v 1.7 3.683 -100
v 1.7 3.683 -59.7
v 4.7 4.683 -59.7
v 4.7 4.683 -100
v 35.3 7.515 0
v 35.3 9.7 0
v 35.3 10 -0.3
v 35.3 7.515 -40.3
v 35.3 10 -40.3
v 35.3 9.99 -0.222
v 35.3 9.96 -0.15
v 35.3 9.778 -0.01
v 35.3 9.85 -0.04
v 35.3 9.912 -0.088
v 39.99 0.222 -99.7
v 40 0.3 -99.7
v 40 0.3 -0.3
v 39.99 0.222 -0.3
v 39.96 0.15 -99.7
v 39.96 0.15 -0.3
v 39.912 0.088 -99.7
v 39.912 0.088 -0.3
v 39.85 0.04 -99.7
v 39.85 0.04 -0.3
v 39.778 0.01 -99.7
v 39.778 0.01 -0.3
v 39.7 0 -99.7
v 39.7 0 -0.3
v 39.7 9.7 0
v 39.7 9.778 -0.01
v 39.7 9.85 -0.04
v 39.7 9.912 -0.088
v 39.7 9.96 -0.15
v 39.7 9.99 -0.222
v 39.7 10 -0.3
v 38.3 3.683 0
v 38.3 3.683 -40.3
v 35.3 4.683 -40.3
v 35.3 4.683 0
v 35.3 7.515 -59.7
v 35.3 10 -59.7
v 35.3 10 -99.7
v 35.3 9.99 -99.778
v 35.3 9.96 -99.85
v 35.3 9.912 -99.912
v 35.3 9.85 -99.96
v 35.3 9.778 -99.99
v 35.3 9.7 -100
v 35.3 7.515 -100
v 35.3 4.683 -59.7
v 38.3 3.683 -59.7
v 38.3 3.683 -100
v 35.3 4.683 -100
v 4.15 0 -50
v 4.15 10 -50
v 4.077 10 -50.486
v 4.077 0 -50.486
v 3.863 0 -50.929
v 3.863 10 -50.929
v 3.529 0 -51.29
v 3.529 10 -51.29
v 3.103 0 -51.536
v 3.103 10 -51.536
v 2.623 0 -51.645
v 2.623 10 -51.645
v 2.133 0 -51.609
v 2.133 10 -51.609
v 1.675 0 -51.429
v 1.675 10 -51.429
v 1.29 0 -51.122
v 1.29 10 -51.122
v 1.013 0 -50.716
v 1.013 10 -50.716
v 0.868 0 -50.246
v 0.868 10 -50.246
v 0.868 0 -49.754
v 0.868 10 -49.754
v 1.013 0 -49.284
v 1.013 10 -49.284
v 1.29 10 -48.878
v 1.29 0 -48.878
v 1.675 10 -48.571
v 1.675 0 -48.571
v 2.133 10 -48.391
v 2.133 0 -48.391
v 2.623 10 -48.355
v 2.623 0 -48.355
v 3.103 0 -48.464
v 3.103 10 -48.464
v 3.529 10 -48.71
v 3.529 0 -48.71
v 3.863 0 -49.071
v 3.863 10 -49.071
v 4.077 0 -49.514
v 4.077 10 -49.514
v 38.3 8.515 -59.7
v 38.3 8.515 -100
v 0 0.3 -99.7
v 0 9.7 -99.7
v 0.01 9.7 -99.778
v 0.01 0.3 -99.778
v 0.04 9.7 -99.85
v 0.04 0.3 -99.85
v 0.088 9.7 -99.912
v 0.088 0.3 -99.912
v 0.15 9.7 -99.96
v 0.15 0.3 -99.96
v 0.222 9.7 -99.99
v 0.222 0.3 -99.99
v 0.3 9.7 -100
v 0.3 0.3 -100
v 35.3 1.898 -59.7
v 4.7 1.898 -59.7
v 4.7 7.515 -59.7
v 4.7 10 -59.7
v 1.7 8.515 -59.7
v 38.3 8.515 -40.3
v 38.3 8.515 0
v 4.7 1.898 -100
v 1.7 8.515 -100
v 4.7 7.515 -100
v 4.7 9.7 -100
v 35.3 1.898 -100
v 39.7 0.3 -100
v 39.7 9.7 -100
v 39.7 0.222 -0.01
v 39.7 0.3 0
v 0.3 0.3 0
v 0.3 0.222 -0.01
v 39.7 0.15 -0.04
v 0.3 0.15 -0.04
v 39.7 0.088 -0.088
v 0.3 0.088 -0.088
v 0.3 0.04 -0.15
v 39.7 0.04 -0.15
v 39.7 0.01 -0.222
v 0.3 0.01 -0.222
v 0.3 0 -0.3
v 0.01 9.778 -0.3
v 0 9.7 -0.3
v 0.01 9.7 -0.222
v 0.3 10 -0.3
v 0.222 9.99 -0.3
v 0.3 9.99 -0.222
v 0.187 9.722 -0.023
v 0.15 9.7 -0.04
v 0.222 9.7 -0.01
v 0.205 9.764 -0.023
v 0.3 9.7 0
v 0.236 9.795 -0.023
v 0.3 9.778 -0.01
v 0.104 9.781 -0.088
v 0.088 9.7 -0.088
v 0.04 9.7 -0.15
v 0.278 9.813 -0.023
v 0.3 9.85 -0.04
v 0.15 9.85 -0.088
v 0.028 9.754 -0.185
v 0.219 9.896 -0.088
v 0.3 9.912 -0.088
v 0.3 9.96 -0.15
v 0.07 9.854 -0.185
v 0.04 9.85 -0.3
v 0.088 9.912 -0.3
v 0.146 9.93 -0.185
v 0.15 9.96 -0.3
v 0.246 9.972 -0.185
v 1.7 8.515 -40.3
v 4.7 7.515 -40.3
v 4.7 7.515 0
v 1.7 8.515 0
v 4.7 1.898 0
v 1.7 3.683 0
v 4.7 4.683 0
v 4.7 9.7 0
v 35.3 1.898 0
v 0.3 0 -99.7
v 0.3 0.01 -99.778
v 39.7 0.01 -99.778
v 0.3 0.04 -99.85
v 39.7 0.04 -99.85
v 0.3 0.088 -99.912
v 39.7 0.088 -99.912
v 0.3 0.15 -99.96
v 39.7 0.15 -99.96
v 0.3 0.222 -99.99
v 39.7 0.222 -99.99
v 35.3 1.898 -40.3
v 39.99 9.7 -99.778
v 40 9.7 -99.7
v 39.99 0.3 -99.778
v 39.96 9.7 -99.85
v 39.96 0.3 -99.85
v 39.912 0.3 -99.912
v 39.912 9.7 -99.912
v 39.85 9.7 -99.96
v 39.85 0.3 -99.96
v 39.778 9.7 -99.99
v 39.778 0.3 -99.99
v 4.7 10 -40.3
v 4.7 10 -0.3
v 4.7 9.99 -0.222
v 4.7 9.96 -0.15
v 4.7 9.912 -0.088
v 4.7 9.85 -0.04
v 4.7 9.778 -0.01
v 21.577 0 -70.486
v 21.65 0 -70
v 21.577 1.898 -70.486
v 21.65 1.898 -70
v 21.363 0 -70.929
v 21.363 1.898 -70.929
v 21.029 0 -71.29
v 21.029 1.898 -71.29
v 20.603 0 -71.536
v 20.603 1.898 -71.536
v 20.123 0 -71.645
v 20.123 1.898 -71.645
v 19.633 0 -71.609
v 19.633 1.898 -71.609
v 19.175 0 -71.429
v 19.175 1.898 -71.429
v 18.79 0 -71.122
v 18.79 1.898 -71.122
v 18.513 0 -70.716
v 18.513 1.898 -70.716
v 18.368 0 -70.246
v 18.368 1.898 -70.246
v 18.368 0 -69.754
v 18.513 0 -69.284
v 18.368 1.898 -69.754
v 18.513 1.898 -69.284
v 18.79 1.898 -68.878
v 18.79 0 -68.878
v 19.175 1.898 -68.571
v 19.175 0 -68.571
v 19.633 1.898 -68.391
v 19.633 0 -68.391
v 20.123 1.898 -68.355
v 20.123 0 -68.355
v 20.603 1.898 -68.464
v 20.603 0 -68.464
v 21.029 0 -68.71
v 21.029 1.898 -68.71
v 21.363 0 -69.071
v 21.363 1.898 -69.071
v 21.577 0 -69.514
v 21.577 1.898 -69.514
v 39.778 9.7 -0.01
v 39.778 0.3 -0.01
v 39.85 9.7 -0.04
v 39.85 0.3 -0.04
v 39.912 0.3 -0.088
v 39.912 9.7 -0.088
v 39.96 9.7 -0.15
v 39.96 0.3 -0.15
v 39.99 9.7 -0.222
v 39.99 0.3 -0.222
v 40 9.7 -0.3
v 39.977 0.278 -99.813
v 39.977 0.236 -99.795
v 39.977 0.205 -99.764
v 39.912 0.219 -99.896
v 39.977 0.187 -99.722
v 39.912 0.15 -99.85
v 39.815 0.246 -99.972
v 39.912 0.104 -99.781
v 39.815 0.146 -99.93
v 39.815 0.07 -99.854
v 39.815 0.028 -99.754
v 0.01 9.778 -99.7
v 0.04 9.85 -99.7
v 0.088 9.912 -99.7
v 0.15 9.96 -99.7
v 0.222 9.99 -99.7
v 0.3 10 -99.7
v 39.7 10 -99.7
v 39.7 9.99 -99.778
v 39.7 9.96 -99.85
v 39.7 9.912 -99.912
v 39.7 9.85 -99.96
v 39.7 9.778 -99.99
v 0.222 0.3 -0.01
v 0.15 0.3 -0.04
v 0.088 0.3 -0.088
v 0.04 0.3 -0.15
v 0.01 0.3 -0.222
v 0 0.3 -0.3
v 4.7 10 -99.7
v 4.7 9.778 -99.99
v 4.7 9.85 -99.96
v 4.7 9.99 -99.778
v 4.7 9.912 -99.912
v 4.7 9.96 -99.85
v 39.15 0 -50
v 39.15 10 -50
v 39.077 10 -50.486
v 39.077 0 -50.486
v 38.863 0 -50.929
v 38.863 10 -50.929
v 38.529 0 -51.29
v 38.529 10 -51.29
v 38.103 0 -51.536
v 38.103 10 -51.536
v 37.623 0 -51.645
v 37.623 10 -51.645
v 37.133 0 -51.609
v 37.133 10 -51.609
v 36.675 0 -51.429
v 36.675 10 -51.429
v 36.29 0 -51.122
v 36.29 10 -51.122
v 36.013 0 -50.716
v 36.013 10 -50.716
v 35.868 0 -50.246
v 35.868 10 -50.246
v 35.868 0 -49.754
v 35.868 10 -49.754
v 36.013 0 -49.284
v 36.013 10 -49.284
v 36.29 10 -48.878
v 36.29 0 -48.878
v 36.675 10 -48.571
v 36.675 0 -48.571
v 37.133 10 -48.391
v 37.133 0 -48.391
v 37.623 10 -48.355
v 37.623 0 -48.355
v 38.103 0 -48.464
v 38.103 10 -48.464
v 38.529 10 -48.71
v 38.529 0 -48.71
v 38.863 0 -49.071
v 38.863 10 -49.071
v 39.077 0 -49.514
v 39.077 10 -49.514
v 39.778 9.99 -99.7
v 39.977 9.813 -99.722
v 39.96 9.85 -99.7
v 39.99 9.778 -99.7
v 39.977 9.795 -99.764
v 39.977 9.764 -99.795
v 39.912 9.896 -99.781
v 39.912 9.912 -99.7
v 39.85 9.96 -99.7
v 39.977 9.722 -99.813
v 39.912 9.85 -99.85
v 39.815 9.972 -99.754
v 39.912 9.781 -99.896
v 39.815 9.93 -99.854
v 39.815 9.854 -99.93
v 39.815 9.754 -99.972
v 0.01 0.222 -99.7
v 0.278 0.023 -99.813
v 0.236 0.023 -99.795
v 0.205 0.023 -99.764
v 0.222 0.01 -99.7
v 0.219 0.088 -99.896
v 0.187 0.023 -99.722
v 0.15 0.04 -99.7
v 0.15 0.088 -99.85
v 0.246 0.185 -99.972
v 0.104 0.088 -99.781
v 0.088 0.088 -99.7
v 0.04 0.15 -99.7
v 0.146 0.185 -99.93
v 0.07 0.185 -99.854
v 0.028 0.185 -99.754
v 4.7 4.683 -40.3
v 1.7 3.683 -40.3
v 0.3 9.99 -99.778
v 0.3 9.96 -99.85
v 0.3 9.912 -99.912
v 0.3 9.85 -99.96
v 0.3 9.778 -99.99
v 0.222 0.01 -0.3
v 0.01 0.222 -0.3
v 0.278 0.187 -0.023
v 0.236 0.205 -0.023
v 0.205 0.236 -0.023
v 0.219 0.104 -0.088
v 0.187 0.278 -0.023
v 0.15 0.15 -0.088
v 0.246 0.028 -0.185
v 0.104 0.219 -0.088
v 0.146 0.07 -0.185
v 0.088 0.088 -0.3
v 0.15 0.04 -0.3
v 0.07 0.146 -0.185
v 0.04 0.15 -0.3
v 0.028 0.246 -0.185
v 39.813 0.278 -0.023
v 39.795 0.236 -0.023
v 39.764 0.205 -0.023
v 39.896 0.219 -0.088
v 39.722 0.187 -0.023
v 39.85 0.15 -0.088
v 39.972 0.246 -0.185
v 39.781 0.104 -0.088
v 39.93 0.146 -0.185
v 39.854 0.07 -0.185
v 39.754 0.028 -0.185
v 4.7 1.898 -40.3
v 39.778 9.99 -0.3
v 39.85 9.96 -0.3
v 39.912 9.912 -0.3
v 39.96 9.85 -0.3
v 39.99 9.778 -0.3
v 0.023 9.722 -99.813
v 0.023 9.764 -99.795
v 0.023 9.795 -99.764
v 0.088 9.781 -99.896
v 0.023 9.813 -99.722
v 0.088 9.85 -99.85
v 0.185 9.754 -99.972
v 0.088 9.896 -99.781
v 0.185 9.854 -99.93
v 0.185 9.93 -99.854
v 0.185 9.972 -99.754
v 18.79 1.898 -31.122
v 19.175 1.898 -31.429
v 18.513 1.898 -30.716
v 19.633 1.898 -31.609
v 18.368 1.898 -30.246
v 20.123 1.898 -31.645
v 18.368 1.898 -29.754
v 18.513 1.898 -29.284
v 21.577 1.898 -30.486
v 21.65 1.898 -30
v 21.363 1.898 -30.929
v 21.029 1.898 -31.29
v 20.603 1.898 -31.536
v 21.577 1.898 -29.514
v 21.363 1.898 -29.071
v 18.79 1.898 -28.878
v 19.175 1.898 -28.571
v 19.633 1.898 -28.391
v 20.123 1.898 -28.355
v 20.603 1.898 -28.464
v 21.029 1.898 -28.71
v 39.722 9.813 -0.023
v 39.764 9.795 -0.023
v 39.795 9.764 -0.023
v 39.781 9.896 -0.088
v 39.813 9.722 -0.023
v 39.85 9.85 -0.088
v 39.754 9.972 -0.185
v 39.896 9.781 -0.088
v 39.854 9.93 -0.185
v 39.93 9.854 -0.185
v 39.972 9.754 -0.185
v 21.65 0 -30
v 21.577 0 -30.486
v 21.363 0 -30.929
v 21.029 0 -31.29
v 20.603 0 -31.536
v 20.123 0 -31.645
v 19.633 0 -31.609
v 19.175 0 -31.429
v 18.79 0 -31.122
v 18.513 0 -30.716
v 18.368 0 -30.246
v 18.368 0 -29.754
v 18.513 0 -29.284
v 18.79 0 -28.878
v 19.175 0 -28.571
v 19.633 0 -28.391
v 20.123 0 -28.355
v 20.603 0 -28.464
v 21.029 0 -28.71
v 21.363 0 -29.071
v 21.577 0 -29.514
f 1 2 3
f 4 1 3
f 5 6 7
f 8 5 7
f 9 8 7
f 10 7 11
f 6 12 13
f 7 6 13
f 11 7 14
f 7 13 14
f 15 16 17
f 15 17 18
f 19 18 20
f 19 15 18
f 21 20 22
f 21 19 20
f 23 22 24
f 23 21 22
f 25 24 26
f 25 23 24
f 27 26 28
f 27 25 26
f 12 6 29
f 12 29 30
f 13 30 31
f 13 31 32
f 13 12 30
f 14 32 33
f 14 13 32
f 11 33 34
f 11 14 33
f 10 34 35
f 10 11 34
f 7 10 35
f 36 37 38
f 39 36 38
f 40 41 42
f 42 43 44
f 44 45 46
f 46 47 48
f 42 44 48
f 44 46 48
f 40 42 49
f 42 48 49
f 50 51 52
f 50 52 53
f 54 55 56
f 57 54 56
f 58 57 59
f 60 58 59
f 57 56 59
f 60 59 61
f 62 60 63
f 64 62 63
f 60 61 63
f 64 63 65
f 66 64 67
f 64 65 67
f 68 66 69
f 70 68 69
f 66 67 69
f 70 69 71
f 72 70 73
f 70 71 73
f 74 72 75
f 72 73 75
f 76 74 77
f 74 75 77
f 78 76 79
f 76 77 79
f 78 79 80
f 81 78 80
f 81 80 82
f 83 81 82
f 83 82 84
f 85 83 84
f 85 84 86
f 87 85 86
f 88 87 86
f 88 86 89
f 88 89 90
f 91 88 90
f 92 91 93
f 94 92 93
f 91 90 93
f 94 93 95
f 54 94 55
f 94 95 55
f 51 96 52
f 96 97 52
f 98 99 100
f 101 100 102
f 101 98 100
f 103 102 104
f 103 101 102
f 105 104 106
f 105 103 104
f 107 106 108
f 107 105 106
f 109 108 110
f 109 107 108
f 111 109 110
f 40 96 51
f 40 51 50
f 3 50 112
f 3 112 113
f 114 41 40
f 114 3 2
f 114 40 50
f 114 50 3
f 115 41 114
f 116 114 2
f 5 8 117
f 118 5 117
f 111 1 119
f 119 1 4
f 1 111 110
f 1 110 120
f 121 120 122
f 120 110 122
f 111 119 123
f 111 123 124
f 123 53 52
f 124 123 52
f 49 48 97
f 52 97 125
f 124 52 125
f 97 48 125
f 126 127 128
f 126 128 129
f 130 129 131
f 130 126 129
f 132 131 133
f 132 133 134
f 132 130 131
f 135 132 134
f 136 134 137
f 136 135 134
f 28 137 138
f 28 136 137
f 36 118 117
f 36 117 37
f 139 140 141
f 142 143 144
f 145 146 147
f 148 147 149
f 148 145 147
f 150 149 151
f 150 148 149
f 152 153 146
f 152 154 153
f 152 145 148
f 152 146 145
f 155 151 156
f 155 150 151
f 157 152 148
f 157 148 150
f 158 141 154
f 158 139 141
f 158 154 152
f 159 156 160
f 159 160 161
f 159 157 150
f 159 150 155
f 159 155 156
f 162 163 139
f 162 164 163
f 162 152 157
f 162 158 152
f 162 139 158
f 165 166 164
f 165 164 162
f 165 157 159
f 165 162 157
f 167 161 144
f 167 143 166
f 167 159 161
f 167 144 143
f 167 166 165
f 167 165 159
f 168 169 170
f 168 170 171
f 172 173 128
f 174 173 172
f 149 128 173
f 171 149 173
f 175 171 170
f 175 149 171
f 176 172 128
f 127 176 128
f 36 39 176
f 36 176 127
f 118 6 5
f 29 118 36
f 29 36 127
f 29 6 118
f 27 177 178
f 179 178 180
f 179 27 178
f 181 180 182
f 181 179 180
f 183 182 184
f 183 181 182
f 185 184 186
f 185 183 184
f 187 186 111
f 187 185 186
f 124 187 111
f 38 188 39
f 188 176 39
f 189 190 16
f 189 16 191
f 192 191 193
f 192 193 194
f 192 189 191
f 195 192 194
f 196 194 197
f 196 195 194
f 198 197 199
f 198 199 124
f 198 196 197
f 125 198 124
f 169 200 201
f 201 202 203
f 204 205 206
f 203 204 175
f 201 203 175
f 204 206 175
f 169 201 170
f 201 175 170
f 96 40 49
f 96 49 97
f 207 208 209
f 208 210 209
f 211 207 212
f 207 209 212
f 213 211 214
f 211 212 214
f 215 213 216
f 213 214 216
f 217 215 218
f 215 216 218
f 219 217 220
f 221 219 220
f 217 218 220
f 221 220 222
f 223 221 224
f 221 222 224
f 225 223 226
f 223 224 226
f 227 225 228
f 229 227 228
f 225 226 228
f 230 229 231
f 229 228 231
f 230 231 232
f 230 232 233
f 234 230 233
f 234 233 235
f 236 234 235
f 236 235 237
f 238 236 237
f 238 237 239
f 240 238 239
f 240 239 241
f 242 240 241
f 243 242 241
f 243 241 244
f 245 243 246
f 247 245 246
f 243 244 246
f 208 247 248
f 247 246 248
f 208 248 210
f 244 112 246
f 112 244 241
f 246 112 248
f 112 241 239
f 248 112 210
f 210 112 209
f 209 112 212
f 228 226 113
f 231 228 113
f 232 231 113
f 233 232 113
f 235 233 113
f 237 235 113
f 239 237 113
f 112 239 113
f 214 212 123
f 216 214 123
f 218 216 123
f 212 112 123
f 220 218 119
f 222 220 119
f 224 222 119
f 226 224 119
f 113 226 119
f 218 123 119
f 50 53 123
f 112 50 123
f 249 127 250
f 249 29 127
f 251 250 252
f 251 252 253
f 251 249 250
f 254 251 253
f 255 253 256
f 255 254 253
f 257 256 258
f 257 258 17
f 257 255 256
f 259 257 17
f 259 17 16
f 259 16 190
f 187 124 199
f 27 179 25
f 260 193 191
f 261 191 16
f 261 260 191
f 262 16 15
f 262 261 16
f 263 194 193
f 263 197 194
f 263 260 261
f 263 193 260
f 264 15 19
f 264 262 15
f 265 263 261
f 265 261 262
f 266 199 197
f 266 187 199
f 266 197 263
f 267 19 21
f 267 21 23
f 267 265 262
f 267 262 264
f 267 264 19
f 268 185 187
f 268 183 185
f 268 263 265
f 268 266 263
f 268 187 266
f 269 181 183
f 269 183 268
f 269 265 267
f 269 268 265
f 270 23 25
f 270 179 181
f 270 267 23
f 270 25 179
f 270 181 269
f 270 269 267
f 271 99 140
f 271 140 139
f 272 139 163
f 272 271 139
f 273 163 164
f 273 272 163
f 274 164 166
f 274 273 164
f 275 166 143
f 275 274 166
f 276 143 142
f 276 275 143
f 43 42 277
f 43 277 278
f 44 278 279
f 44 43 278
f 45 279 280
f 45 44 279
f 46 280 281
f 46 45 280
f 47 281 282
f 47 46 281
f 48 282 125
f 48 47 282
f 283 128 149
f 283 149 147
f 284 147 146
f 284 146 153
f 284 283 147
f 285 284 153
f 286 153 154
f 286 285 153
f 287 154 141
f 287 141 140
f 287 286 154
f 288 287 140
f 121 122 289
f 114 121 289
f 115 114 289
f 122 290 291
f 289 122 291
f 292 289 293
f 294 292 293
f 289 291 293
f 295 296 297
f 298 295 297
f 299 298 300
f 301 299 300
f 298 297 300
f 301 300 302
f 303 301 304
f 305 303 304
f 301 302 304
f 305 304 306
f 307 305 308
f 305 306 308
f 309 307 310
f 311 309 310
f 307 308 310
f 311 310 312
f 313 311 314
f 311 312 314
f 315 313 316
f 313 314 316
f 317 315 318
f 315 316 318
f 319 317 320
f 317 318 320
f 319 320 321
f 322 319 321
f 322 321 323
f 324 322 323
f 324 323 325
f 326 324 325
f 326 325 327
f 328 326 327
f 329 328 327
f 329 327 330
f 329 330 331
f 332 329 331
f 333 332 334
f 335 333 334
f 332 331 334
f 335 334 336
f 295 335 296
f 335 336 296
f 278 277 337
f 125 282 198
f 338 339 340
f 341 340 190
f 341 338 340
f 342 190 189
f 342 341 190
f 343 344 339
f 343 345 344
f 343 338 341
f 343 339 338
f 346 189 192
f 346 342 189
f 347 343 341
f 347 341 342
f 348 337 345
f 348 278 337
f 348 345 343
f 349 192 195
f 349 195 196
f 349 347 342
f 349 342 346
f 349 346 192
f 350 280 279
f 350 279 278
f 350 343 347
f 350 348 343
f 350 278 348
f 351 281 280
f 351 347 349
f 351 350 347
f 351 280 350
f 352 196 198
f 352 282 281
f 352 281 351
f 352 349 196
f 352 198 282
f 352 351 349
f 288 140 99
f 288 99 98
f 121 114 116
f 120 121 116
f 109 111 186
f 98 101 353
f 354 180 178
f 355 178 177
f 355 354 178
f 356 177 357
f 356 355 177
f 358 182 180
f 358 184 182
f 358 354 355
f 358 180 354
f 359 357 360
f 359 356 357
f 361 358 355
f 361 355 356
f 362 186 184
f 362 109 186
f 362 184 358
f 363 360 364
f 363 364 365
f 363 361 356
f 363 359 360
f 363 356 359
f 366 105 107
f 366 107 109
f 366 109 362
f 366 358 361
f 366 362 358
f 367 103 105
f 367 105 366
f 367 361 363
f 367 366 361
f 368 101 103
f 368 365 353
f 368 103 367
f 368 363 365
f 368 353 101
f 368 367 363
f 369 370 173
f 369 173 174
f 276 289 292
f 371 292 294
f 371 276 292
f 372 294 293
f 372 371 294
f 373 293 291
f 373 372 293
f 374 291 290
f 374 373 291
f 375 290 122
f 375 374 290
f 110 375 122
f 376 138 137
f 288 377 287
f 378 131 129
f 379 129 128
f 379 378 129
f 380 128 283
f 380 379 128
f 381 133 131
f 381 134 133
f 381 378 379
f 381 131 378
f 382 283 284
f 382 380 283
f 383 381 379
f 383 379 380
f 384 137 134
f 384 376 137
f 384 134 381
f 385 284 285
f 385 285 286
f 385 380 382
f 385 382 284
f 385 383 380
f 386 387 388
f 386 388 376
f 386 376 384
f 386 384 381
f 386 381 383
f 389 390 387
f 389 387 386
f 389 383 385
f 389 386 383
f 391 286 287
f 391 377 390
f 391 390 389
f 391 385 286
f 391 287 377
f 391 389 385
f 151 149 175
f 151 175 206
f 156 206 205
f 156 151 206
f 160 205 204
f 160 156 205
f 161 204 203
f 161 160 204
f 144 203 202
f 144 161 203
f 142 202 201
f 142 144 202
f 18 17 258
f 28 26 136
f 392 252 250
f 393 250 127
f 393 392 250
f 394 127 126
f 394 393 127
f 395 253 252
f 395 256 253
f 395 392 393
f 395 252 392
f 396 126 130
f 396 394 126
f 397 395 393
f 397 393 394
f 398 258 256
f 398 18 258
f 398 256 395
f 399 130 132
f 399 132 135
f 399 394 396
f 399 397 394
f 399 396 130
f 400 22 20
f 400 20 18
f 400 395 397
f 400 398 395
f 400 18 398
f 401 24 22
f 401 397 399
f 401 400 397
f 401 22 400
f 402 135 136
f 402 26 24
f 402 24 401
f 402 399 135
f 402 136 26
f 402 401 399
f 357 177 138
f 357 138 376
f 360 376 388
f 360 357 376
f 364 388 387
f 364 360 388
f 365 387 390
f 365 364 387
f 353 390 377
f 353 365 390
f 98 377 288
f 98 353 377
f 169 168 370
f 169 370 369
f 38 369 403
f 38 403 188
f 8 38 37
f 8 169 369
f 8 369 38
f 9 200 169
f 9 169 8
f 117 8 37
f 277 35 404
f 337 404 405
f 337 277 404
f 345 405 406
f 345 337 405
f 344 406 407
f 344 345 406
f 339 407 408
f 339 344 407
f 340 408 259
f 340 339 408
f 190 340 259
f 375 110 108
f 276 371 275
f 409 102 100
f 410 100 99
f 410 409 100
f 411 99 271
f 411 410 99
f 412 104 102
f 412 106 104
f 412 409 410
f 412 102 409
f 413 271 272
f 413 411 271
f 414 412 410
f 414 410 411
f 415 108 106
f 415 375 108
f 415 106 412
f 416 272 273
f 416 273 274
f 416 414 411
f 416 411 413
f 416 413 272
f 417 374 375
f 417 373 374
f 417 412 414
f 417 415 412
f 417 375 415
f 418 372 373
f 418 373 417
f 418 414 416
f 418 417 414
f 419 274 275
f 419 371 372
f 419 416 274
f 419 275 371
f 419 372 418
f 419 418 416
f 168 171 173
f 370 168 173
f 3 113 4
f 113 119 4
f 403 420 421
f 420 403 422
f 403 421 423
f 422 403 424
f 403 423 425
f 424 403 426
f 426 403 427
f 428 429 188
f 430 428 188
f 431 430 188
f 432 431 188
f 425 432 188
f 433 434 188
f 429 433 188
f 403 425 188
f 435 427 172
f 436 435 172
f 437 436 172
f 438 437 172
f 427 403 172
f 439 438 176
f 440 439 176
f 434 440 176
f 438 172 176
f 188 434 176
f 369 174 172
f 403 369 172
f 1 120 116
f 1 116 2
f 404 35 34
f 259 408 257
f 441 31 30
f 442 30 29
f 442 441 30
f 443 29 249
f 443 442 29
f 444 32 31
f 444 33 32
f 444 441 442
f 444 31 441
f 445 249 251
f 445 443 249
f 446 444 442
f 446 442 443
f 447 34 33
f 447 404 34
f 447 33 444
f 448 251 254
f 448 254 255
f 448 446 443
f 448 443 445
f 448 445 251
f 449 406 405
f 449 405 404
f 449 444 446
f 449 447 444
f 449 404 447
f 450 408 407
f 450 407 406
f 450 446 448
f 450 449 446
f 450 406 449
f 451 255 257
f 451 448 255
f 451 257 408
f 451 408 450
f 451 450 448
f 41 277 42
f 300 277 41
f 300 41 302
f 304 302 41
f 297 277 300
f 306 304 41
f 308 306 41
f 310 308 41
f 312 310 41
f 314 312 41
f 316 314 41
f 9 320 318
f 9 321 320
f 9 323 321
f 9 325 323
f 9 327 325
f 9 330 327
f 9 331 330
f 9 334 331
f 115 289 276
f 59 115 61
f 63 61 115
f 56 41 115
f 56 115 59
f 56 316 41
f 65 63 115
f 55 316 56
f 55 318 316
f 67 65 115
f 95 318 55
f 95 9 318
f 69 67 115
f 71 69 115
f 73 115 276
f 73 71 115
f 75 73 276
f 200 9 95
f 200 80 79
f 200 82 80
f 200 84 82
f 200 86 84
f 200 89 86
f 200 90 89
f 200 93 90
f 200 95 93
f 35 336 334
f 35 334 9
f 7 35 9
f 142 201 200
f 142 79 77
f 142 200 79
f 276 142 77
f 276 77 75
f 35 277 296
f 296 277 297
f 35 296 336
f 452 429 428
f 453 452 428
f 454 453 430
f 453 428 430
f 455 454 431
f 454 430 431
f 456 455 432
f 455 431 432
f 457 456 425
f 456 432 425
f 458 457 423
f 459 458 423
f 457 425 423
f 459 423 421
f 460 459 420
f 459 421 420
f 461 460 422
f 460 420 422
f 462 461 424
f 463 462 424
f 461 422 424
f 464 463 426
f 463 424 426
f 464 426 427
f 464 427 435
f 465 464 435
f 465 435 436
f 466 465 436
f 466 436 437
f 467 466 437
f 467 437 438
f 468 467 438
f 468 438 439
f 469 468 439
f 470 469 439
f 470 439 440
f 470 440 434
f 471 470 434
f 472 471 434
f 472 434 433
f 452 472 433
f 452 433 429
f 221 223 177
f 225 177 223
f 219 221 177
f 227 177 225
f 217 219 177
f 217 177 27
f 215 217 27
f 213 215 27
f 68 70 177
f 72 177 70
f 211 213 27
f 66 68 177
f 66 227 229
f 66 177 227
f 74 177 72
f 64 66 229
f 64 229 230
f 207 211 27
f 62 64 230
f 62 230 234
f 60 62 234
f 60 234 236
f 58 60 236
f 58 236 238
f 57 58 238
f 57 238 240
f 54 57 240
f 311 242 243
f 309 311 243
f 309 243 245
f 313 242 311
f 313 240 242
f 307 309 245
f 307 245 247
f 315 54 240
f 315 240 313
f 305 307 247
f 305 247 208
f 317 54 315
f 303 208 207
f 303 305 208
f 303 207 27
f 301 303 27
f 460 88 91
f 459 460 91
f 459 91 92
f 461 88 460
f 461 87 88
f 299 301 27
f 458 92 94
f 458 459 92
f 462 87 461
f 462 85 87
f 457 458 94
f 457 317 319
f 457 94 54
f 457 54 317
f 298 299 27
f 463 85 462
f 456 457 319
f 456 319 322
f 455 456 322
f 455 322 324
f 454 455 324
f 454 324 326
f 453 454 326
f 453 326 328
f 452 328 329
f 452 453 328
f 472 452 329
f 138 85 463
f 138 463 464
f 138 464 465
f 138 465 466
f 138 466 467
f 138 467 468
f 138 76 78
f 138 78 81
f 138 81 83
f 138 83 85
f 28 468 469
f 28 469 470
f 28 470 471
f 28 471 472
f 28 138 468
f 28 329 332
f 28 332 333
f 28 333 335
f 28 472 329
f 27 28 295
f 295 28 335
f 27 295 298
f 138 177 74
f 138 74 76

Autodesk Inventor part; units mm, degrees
ref_plane "YZ Plane" through (0, 0, 0) normal (1, 0, 0) x (0, 1, 0)
ref_plane "XZ Plane" through (0, 0, 0) normal (0, 1, 0) x (-1, 0, 0)
ref_plane "XY Plane" through (0, 0, 0) normal (0, 0, 1) x (1, 0, 0)
sketch "Sketch1" plane through (0, 0, 0) normal (0, 0, 1) x (1, 0, 0)
  line L0 (0, 0) -> (40, 0)
  line L1 (40, 0) -> (40, 10)
  line L2 (40, 10) -> (0, 10)
  line L3 (0, 10) -> (0, 0)
  dimension "d0" = 40
  dimension "d1" = 10
extrude "Extrusion1" add sketch "Sketch1" against normal blind 100
sketch "Sketch2" plane through (0, 0, 0) normal (0, 0, 1) x (1, 0, 0)
  line L0 (4.7, 1.898) -> (35.3, 1.898)
  line L1 (38.3, 8.5152) -> (38.3, 3.6828)
  line L2 (1.7, 8.5152) -> (1.7, 3.6828)
  line L3 (35.3, 7.5152) -> (38.3, 8.5152)
  line L4 (35.3, 7.5152) -> (35.3, 10)
  line L5 (35.3, 1.898) -> (35.3, 4.6828)
  line L6 (38.3, 3.6828) -> (35.3, 4.6828)
  line L7 (4.7, 7.5152) -> (1.7, 8.5152)
  line L8 (4.7, 10) -> (4.7, 7.5152)
  line L9 (4.7, 4.6828) -> (4.7, 1.898)
  line L10 (1.7, 3.6828) -> (4.7, 4.6828)
  line L11 (4.7, 10) -> (35.3, 10)
extrude "Extrusion2" cut sketch "Sketch2" against normal blind 40.3
sketch "Sketch3" plane through (0, 0, -100) normal (0, 0, -1) x (-1, 0, 0)
  line L0 (-35.3, 1.898) -> (-4.7, 1.898)
  line L1 (-1.7, 8.5152) -> (-1.7, 3.6828)
  line L2 (-38.3, 8.5152) -> (-38.3, 3.6828)
  line L3 (-4.7, 7.5152) -> (-1.7, 8.5152)
  line L4 (-4.7, 7.5152) -> (-4.7, 10)
  line L5 (-4.7, 1.898) -> (-4.7, 4.6828)
  line L6 (-1.7, 3.6828) -> (-4.7, 4.6828)
  line L7 (-35.3, 7.5152) -> (-38.3, 8.5152)
  line L8 (-35.3, 10) -> (-35.3, 7.5152)
  line L9 (-35.3, 4.6828) -> (-35.3, 1.898)
  line L10 (-38.3, 3.6828) -> (-35.3, 4.6828)
  line L11 (-35.3, 10) -> (-4.7, 10)
extrude "Extrusion3" cut sketch "Sketch3" against normal blind 40.3
sketch "Sketch5" plane through (4.7, 1.898, 0) normal (0, 1, 0) x (1, 0, 0)
  circle A0 centre (15.3, 30) radius 1.65
  line L0 (35.3, 0) -> (35.3, 100) projected
  circle A1 centre (15.3, 70) radius 1.65
  point P0 (-4.7, 0)
extrude "Extrusion5" cut sketch "Sketch5" against normal blind 5
fillet "Fillet1" radius 0.3 14 edges at (2.35, 10, -100) (37.65, 10, -100) (0, 5, -100) (0, 10, -50) (0, 0, -50) (20, 0, -100) (40, 5, -100) (0, 5, 0) (40, 10, -50) (40, 0, -50) (20, 0, 0) (40, 5, 0) (2.35, 10, 0) (37.65, 10, 0)
sketch "Sketch6" plane through (4.7, 10, -40.3) normal (0, 1, 0) x (1, 0, 0)
  line L0 (-4.4, -40) -> (-4.4, 59.4) projected
  line L1 (-4.7, 59.4) -> (-4.7, -40) projected
  line L2 (35.3, -40) -> (35.3, 59.4) projected
  circle A0 centre (32.8, 9.7) radius 1.65
  circle A1 centre (-2.2, 9.7) radius 1.65
  point P0 (-4.7, -40.3)
  dimension "d29" = 3.3
  dimension "d30" = 3.3
extrude "Extrusion6" cut sketch "Sketch6" against normal blind 10
properties part number "centralBody"
